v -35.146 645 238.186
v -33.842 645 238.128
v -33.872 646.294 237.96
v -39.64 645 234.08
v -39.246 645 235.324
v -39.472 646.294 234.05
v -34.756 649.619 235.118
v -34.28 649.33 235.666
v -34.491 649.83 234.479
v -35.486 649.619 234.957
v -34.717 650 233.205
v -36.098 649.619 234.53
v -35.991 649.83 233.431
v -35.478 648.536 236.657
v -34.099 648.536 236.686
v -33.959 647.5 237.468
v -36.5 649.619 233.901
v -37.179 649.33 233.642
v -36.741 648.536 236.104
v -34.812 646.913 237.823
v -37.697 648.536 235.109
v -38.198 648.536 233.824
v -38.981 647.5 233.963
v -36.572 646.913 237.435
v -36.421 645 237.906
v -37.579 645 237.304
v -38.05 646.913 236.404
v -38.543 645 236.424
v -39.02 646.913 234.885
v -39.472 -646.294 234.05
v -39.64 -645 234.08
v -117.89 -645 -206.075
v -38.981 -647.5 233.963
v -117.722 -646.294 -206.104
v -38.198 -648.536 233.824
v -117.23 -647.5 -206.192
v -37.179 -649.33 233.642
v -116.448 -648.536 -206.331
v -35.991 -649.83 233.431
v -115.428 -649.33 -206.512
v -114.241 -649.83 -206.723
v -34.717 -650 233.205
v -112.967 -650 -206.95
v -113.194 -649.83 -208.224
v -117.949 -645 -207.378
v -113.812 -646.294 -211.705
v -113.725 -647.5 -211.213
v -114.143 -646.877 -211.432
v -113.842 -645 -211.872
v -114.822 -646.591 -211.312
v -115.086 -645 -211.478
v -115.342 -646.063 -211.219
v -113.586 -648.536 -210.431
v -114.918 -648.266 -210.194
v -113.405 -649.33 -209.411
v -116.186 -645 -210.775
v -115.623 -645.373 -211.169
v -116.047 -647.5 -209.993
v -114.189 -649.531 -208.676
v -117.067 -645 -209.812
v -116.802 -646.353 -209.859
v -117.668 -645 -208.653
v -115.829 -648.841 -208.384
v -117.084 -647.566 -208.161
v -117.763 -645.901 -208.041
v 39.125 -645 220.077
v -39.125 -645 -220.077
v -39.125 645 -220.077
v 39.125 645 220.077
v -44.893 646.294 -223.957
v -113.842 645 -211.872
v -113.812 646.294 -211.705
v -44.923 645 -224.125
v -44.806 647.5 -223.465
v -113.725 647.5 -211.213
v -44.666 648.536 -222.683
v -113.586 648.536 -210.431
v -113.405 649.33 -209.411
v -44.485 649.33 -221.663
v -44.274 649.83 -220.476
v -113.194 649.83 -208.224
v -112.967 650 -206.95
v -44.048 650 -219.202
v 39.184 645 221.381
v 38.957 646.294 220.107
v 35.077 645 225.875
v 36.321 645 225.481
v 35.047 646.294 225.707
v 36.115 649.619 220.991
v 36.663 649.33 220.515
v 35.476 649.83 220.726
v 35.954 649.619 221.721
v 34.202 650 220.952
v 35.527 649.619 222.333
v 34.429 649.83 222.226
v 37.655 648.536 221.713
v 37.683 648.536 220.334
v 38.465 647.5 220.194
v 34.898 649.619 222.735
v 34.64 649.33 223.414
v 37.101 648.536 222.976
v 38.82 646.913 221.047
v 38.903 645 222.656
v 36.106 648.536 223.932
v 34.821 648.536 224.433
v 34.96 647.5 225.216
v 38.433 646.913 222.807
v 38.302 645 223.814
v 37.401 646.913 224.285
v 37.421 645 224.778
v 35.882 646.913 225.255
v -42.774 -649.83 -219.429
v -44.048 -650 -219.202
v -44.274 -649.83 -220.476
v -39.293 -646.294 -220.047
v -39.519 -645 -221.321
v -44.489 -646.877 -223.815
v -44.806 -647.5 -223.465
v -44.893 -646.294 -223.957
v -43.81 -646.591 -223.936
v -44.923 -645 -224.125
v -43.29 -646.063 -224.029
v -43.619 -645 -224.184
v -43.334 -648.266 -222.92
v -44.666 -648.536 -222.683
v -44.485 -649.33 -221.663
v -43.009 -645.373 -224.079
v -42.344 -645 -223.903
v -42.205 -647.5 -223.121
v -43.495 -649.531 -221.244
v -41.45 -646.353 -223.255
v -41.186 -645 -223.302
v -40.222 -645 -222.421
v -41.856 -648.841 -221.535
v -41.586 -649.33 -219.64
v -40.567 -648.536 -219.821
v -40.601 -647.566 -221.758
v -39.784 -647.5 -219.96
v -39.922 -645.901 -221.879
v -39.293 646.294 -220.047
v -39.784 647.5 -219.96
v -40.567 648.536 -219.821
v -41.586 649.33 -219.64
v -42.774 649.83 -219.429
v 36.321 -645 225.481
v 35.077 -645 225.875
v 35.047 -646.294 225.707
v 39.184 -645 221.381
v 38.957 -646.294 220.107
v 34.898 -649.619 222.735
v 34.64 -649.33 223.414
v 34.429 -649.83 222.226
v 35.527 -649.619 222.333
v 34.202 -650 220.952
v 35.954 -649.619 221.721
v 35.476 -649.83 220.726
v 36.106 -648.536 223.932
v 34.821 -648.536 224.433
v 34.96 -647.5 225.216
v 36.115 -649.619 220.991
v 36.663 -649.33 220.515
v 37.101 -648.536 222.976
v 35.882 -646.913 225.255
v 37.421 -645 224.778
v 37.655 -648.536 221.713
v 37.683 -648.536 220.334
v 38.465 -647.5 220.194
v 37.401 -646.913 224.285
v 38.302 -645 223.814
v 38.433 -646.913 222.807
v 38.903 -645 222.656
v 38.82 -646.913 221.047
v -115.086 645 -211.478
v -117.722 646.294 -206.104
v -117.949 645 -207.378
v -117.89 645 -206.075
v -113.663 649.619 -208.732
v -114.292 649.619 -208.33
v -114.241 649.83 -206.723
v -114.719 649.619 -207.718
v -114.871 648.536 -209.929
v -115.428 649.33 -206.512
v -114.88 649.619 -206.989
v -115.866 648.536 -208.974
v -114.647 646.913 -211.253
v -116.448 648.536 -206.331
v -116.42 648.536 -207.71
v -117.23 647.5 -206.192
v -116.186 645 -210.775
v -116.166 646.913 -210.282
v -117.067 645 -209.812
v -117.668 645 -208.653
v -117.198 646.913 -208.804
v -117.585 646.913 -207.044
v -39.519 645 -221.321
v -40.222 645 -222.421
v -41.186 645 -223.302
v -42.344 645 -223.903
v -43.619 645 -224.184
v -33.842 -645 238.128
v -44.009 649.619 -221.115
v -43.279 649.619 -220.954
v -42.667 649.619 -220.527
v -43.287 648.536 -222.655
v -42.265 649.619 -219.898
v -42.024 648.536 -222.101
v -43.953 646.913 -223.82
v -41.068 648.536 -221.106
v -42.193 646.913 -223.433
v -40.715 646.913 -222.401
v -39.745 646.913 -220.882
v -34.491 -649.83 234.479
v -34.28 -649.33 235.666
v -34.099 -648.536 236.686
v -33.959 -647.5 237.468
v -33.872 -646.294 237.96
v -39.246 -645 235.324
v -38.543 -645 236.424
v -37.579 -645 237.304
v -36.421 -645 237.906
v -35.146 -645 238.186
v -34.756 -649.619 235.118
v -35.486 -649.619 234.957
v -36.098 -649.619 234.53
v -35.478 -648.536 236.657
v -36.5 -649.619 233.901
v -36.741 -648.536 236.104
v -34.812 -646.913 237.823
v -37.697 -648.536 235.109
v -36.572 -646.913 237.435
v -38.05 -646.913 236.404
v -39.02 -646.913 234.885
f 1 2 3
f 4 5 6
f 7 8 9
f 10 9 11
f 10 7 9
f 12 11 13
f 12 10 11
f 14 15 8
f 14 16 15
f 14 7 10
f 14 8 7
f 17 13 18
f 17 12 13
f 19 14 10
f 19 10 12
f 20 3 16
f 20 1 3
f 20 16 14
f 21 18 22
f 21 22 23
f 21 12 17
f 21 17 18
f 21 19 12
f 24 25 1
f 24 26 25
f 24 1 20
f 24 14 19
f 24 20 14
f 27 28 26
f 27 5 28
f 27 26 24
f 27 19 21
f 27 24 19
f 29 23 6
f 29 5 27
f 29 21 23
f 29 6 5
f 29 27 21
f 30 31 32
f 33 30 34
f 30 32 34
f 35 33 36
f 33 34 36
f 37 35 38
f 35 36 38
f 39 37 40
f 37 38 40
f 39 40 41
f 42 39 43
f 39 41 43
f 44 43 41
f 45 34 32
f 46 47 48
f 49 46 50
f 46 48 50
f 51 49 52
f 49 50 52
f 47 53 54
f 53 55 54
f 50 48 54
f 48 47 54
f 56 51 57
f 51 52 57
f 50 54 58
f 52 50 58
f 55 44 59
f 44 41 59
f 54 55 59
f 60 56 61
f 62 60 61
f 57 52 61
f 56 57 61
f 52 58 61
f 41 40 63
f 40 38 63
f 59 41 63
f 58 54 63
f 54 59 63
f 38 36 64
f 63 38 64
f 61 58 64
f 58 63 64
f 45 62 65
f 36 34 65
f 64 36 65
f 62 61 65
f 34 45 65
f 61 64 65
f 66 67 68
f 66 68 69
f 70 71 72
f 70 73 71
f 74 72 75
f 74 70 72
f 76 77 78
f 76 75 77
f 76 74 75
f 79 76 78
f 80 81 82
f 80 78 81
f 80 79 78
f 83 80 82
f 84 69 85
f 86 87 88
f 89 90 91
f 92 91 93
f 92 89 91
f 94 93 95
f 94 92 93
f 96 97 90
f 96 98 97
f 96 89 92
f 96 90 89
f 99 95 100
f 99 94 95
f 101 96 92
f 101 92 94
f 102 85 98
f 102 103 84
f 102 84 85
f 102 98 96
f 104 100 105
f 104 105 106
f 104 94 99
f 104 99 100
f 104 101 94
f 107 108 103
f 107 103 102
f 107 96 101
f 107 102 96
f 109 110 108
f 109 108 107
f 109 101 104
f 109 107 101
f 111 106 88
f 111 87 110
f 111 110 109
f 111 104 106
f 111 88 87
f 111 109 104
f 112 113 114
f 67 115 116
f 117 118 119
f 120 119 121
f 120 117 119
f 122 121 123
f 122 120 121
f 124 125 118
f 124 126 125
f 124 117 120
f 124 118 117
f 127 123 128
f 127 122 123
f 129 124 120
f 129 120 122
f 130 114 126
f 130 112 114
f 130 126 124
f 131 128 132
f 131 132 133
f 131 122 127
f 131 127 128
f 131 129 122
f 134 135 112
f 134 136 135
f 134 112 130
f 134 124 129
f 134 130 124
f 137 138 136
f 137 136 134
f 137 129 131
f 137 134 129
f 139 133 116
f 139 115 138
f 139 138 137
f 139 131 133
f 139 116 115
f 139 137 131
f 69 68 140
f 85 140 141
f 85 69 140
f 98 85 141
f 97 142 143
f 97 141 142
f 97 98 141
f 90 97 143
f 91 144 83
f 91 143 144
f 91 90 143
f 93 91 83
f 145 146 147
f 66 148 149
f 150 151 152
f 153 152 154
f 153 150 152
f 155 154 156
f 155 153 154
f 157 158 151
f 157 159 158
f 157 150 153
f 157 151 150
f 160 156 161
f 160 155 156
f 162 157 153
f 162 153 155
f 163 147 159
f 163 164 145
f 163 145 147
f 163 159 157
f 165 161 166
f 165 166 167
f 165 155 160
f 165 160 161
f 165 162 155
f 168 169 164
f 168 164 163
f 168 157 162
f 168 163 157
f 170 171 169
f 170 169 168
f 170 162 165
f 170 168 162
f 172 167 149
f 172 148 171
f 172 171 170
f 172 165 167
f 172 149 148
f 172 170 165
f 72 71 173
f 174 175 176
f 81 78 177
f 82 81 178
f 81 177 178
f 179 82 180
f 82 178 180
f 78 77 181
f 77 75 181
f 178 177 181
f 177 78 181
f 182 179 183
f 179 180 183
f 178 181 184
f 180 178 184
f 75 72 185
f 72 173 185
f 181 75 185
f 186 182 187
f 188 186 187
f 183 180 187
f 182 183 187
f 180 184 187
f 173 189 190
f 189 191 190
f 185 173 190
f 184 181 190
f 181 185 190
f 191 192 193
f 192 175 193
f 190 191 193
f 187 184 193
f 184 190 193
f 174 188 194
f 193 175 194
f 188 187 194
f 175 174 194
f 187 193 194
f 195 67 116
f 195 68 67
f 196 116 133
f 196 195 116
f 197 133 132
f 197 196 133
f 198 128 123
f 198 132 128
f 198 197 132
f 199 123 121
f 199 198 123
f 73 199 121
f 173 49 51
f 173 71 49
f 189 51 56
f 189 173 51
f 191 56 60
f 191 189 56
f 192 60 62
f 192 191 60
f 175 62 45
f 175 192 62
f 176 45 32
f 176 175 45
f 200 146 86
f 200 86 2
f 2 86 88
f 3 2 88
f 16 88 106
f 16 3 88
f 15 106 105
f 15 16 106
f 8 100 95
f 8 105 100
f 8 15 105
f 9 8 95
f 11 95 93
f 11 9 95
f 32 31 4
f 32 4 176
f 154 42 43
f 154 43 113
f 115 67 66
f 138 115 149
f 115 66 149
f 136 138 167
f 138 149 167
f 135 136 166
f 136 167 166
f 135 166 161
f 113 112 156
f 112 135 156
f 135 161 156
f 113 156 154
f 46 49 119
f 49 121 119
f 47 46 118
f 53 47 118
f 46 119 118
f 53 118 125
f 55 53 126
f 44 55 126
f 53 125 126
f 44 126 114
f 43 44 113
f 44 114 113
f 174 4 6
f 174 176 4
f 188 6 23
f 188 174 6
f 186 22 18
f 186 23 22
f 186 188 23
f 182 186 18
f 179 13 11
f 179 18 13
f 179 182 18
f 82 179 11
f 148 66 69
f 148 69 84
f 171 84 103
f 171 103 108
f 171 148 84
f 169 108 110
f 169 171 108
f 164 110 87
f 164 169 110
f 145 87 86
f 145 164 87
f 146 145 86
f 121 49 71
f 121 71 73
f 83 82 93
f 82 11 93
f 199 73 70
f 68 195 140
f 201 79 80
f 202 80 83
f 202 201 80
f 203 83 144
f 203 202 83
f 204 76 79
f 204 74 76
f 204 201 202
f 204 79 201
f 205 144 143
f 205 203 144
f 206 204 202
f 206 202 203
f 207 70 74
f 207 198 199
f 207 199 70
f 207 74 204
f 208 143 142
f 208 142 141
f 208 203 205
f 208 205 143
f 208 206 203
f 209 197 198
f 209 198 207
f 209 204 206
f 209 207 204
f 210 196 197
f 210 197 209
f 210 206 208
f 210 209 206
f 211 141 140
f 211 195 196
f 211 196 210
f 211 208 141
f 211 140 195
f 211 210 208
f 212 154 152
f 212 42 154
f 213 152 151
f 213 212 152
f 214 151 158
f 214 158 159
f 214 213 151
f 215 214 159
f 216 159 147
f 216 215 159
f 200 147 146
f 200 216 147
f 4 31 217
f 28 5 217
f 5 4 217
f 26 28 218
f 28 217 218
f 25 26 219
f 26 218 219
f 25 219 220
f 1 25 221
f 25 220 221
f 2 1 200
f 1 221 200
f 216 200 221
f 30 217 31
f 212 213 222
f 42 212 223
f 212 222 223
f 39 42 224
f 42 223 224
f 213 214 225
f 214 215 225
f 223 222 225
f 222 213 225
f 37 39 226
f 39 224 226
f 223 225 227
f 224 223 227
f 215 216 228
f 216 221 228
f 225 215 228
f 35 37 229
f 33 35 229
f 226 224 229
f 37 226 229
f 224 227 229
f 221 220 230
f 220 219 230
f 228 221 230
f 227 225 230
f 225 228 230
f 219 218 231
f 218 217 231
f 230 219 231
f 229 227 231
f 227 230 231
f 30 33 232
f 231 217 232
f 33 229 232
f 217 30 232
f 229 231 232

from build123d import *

# Parameters (mm, degrees)
F1_DEPTH = 650
F2_R     = 5


with BuildPart() as f1:
    # F0 (on Front) → F1 (new body, symmetric)
    with BuildSketch(Plane.XZ):
        Polygon((-40, -225), (40, 225), (-38.765001, 239.002667), (-118.765001, -210.997333), align=None)
    extrude(amount=F1_DEPTH, both=True)

    # F2
    f2_edges = [f1.edges().sort_by_distance(p)[0] for p in [
        (40, 0, 225),
        (-38.765001, 0, 239.002667),
        (0.6175, -650, 232.001333),
        (0, -650, 0),
        (-78.765001, -650, 14.002667),
        (-79.3825, -650, -217.998667),
        (-40, 0, -225),
        (-118.765001, 0, -210.997333),
        (-79.3825, 650, -217.998667),
        (0, 650, 0),
        (0.6175, 650, 232.001333),
        (-78.765001, 650, 14.002667),
    ]]
    fillet(f2_edges, radius=F2_R)


solid = f1.part
